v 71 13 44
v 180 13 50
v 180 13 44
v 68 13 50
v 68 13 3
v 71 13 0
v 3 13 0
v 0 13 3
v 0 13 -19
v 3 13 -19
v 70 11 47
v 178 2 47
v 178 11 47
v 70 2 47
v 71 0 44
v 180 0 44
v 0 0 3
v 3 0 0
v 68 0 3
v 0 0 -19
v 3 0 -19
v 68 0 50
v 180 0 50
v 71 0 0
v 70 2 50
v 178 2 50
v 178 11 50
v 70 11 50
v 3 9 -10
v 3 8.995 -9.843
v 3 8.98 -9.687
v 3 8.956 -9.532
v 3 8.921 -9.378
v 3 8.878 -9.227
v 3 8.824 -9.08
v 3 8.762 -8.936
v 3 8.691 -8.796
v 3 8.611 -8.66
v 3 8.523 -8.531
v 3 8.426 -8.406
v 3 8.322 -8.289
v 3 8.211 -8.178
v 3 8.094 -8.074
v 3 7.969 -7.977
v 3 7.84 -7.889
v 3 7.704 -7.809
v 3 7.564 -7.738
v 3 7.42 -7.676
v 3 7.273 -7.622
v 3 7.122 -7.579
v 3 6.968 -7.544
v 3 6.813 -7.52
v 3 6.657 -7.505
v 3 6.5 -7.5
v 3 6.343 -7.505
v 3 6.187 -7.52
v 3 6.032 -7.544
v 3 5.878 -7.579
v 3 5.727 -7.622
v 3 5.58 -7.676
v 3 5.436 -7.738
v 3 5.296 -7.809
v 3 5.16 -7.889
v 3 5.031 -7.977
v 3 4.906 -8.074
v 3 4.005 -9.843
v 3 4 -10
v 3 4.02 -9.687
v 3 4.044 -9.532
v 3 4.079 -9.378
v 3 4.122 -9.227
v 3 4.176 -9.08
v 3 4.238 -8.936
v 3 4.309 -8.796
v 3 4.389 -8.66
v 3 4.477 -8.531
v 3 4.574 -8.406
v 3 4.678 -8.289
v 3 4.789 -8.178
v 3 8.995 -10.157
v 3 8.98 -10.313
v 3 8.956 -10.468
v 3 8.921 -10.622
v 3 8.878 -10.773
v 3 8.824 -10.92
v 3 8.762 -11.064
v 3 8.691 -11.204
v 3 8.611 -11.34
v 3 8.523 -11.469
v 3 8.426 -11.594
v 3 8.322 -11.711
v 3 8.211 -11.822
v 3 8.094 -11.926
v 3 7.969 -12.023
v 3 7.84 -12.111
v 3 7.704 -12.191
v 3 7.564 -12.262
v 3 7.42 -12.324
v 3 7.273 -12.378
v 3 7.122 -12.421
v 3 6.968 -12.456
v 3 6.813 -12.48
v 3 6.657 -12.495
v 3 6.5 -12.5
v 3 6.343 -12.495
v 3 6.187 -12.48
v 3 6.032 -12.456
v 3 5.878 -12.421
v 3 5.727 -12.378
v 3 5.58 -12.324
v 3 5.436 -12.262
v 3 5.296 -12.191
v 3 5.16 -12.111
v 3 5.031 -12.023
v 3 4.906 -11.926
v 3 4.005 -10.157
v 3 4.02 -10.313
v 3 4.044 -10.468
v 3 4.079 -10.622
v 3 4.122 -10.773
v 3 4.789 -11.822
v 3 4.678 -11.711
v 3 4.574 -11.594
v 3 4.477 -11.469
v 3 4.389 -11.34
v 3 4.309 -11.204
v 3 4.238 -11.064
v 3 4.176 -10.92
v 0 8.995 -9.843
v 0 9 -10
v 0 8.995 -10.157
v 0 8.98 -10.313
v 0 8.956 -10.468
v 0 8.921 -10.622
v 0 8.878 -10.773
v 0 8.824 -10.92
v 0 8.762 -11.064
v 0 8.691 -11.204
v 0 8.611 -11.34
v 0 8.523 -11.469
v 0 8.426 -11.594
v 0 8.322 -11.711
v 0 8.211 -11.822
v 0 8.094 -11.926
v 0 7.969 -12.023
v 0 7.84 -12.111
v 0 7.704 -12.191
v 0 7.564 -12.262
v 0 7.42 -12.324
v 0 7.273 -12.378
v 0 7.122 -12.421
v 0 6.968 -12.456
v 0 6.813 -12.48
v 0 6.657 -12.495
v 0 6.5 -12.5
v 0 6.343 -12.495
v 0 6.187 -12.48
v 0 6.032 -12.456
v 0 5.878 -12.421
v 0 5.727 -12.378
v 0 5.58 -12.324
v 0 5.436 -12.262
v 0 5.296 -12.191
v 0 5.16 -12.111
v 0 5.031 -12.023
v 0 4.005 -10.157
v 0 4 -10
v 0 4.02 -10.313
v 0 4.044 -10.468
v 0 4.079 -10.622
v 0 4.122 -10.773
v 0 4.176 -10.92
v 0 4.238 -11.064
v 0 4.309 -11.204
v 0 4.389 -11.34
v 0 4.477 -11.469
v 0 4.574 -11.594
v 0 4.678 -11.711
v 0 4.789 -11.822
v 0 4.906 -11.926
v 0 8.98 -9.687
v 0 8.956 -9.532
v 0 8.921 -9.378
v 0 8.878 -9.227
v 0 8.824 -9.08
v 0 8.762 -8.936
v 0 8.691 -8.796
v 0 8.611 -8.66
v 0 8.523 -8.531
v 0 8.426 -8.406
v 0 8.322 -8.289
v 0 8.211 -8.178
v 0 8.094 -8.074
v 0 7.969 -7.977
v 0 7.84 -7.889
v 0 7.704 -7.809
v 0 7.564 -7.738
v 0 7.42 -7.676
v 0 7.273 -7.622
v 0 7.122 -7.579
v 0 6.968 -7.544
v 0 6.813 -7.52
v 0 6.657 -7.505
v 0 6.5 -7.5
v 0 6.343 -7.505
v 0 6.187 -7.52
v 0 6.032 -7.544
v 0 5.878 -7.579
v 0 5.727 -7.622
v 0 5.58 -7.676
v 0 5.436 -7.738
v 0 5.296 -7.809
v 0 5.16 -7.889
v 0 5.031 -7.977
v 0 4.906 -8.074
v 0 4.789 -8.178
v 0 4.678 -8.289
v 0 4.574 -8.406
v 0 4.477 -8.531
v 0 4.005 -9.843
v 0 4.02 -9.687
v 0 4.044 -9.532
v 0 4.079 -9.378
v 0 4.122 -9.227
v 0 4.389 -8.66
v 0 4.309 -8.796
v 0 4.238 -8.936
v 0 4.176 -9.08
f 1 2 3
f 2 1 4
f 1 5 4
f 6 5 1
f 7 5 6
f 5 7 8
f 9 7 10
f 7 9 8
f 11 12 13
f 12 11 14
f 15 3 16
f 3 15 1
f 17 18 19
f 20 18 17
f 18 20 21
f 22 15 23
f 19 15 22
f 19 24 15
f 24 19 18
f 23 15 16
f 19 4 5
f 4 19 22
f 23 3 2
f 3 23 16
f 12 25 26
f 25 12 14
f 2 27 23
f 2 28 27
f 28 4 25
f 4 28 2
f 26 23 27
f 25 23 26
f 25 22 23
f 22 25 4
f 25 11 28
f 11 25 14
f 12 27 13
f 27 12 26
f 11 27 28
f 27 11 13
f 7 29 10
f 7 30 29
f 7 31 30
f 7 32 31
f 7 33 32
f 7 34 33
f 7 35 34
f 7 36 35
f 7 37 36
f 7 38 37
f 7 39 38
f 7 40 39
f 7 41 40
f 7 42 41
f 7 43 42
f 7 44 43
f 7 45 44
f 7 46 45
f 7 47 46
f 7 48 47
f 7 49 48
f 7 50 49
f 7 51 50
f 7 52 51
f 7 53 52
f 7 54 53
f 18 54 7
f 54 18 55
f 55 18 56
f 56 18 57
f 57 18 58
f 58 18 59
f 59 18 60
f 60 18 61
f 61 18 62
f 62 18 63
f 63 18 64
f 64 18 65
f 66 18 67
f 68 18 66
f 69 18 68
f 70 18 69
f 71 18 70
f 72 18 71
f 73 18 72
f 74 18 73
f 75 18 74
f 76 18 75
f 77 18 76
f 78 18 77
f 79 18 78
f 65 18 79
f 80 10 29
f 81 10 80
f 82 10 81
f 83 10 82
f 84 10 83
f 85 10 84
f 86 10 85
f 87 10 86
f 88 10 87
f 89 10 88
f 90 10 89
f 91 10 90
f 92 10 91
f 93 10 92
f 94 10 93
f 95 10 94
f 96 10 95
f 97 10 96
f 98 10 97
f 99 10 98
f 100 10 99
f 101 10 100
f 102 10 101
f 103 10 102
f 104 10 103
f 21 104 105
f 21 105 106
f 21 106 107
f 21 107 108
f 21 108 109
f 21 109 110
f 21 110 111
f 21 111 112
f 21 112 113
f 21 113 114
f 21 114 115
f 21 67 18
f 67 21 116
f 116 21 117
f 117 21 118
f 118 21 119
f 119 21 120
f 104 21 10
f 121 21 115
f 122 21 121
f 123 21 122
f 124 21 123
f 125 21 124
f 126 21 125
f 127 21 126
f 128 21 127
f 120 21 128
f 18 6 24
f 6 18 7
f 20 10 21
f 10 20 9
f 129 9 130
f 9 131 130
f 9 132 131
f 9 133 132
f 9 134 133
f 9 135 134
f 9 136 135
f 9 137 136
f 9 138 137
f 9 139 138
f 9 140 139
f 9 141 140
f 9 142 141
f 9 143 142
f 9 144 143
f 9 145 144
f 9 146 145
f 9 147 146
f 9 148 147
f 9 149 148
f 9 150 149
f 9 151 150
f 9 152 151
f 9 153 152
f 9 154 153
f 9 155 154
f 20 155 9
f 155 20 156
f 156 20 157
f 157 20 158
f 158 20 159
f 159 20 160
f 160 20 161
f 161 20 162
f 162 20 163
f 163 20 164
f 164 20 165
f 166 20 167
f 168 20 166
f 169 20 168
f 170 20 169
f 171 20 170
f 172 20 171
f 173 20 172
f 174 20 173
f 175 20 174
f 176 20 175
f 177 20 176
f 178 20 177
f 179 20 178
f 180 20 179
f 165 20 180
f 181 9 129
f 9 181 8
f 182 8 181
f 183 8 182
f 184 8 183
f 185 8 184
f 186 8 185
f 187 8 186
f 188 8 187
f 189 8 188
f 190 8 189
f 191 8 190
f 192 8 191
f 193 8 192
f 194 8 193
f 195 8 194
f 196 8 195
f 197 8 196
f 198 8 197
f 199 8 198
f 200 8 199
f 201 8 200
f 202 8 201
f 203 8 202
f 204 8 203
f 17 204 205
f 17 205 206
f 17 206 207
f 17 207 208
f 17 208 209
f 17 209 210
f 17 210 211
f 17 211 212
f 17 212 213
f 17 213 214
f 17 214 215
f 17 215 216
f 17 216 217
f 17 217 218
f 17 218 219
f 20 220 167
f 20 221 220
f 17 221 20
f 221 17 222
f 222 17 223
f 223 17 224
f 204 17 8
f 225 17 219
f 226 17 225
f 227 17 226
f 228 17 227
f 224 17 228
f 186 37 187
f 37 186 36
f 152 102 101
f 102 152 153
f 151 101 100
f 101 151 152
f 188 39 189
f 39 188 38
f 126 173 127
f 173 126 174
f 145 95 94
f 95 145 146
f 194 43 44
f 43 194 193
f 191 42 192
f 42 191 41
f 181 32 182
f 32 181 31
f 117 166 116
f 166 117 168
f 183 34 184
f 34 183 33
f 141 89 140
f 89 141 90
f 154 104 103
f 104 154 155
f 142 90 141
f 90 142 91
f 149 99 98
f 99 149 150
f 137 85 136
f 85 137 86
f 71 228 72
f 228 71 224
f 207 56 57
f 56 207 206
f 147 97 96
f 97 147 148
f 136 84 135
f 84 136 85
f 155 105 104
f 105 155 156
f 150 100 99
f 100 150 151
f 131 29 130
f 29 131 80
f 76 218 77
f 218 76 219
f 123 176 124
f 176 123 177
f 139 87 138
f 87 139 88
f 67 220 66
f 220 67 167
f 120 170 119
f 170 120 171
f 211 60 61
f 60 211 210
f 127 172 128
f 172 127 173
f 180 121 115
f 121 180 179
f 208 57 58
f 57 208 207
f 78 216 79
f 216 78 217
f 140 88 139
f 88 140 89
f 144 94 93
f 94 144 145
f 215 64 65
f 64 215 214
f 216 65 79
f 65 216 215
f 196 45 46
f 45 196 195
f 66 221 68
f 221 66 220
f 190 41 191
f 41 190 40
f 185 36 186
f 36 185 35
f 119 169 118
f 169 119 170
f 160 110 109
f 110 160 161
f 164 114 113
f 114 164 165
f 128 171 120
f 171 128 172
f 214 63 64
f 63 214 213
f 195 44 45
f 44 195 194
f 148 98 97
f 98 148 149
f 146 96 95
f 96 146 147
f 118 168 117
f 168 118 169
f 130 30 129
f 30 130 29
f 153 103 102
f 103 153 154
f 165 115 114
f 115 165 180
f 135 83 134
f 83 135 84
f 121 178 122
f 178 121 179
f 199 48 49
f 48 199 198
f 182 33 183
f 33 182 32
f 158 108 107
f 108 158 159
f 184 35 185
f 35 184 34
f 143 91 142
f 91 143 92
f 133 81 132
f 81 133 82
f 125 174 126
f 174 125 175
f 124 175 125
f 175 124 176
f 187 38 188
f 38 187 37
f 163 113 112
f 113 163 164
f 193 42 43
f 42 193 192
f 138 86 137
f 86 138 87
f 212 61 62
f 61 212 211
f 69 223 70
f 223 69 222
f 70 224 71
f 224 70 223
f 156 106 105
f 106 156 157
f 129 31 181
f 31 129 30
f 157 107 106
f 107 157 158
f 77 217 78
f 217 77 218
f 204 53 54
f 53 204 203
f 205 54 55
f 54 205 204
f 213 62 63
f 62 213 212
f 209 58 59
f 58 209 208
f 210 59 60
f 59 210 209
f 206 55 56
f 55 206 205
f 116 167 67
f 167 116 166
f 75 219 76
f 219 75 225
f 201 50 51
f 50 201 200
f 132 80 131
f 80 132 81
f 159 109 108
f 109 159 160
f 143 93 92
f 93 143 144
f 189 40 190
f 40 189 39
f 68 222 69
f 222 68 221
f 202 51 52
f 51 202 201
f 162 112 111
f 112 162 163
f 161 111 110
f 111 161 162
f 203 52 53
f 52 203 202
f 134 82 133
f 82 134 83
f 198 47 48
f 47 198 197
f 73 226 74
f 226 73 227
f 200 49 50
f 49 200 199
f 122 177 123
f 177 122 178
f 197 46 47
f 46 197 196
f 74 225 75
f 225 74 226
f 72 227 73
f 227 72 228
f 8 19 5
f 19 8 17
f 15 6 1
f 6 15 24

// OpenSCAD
// top part

rotate ([0,0,90]) translate([0,-180,2]) {
    
translate ([0,0,42]) cube([13,112,3]);

translate ([0,2,45]) cube([2,108,3]);

translate ([11,2,45]) cube([2,108,3]);

translate([0,0,45]) cube([13,2,3]);

translate([0,110,45]) cube([13,2,3]);

}

// middle part

rotate ([0,0,90]) translate ([0,-71,3]) cube([13,3,41]);

cube([71,13,3]);

// bottom part with holes

difference() {

translate([0,0,-19]) cube([3,13,19]);

//hole
    
rotate ([0,90,0]) translate([10,6.5,0]) cylinder(h=3,r=2.5,$fn=100);

}
